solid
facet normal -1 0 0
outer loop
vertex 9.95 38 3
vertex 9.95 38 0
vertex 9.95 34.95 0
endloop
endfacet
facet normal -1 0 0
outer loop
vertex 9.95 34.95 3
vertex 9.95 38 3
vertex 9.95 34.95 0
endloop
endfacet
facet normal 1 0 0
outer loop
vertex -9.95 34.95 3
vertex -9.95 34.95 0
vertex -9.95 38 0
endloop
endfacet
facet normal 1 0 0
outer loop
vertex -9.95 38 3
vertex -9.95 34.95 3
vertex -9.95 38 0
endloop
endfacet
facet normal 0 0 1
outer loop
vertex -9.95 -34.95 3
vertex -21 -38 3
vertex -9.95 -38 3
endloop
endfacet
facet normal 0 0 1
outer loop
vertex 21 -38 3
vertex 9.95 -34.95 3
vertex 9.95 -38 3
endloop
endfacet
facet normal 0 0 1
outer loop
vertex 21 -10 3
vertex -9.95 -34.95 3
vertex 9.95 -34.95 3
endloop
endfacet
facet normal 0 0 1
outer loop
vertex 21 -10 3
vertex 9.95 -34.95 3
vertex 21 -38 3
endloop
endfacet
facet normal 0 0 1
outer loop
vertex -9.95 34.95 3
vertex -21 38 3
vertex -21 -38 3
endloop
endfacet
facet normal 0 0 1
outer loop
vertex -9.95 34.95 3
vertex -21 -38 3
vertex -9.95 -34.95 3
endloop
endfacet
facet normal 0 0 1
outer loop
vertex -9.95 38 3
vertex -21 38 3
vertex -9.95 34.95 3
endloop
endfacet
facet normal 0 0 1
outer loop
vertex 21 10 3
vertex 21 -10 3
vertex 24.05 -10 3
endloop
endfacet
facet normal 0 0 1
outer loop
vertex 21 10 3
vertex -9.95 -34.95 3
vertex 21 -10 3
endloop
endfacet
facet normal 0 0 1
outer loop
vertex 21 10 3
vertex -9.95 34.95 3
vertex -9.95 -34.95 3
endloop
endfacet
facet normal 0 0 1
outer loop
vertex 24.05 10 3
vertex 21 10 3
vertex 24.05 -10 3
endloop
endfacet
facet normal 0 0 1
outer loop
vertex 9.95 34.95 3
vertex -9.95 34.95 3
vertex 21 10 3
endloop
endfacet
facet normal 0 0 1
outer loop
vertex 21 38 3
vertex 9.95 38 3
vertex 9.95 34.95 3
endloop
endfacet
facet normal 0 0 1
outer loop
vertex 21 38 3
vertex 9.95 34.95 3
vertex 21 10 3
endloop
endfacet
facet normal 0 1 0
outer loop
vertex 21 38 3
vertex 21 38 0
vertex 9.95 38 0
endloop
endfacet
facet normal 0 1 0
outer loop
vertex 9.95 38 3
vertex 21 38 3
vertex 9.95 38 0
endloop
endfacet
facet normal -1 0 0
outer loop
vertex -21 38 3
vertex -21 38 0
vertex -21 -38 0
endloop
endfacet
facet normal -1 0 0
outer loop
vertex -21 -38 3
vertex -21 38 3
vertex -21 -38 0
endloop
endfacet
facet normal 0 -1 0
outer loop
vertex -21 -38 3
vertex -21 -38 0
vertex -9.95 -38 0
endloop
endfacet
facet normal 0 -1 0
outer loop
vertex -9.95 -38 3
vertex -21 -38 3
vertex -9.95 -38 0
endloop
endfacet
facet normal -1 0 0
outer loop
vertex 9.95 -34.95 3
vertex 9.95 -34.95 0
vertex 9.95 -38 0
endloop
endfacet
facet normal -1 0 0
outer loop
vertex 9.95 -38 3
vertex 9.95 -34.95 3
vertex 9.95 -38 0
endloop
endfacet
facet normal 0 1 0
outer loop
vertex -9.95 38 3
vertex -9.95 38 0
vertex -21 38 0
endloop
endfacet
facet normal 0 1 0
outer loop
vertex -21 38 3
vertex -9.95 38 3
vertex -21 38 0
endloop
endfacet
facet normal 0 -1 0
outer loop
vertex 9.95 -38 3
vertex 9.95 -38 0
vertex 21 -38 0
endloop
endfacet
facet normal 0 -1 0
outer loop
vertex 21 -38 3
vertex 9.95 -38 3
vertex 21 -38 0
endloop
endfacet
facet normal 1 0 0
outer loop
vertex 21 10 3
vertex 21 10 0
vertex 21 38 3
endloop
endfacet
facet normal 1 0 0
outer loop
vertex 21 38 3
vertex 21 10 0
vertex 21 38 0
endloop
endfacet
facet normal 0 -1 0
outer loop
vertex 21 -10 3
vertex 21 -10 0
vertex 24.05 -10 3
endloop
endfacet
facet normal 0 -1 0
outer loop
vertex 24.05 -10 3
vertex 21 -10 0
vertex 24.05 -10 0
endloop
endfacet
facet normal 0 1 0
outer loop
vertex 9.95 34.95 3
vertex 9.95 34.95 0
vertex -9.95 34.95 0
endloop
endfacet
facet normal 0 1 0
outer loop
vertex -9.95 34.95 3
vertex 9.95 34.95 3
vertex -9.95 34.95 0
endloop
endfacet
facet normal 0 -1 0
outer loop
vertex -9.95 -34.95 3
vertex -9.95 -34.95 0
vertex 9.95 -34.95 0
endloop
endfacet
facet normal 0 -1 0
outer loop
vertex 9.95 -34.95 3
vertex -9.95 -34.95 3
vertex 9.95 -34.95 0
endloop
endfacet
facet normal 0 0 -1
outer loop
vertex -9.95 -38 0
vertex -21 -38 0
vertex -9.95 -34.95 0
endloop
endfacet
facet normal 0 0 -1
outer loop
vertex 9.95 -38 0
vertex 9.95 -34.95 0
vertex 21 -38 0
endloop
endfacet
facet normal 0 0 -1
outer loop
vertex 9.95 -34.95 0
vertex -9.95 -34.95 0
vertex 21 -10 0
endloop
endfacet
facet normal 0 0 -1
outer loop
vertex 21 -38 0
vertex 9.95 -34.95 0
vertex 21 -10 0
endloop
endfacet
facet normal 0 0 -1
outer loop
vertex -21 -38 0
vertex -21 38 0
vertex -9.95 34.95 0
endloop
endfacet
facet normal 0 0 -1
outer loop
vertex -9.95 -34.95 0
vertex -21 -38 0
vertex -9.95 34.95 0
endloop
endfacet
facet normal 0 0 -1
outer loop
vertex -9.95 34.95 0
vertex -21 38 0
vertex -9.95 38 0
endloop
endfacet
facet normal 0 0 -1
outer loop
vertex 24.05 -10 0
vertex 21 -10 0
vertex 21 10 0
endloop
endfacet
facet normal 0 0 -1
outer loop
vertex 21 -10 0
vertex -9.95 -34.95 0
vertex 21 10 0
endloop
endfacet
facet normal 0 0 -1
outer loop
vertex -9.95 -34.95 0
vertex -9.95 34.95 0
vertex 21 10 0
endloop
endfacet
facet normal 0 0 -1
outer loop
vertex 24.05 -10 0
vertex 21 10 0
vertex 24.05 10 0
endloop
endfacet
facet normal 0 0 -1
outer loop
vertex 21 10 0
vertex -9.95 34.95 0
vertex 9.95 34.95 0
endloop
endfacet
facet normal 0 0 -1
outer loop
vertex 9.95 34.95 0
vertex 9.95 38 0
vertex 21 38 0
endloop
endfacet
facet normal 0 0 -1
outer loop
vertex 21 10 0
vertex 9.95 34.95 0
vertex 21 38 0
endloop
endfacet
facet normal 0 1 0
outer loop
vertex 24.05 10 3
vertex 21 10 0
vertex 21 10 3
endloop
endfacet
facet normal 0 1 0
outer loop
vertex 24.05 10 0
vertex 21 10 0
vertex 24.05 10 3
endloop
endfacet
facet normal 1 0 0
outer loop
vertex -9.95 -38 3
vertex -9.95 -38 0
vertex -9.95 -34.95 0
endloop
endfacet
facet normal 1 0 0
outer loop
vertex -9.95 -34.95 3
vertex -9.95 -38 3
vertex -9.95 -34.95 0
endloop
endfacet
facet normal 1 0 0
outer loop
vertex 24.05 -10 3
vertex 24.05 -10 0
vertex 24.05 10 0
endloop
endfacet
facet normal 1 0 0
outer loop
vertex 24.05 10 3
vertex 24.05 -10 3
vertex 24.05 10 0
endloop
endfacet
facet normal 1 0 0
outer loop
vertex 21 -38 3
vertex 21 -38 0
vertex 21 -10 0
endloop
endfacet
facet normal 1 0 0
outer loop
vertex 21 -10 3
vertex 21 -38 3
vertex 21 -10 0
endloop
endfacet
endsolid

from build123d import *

# Parameters (mm, degrees)
F0_W     = 3.05
F0_H     = 20
F1_DEPTH = 3


with BuildPart() as f1:
    # F0 (on Top) → F1 (new body)
    with BuildSketch(Plane.XY):
        with Locations((22.525, 0)):
            Rectangle(F0_W, F0_H)
        Polygon((9.95, -38), (21, -38), (21, -10), (21, 10), (21, 38), (9.95, 38), (9.95, 34.95), (-9.95, 34.95), (-9.95, 38), (-21, 38), (-21, -38), (-9.95, -38), (-9.95, -34.95), (9.95, -34.95), align=None)
    extrude(amount=F1_DEPTH)


solid = f1.part
